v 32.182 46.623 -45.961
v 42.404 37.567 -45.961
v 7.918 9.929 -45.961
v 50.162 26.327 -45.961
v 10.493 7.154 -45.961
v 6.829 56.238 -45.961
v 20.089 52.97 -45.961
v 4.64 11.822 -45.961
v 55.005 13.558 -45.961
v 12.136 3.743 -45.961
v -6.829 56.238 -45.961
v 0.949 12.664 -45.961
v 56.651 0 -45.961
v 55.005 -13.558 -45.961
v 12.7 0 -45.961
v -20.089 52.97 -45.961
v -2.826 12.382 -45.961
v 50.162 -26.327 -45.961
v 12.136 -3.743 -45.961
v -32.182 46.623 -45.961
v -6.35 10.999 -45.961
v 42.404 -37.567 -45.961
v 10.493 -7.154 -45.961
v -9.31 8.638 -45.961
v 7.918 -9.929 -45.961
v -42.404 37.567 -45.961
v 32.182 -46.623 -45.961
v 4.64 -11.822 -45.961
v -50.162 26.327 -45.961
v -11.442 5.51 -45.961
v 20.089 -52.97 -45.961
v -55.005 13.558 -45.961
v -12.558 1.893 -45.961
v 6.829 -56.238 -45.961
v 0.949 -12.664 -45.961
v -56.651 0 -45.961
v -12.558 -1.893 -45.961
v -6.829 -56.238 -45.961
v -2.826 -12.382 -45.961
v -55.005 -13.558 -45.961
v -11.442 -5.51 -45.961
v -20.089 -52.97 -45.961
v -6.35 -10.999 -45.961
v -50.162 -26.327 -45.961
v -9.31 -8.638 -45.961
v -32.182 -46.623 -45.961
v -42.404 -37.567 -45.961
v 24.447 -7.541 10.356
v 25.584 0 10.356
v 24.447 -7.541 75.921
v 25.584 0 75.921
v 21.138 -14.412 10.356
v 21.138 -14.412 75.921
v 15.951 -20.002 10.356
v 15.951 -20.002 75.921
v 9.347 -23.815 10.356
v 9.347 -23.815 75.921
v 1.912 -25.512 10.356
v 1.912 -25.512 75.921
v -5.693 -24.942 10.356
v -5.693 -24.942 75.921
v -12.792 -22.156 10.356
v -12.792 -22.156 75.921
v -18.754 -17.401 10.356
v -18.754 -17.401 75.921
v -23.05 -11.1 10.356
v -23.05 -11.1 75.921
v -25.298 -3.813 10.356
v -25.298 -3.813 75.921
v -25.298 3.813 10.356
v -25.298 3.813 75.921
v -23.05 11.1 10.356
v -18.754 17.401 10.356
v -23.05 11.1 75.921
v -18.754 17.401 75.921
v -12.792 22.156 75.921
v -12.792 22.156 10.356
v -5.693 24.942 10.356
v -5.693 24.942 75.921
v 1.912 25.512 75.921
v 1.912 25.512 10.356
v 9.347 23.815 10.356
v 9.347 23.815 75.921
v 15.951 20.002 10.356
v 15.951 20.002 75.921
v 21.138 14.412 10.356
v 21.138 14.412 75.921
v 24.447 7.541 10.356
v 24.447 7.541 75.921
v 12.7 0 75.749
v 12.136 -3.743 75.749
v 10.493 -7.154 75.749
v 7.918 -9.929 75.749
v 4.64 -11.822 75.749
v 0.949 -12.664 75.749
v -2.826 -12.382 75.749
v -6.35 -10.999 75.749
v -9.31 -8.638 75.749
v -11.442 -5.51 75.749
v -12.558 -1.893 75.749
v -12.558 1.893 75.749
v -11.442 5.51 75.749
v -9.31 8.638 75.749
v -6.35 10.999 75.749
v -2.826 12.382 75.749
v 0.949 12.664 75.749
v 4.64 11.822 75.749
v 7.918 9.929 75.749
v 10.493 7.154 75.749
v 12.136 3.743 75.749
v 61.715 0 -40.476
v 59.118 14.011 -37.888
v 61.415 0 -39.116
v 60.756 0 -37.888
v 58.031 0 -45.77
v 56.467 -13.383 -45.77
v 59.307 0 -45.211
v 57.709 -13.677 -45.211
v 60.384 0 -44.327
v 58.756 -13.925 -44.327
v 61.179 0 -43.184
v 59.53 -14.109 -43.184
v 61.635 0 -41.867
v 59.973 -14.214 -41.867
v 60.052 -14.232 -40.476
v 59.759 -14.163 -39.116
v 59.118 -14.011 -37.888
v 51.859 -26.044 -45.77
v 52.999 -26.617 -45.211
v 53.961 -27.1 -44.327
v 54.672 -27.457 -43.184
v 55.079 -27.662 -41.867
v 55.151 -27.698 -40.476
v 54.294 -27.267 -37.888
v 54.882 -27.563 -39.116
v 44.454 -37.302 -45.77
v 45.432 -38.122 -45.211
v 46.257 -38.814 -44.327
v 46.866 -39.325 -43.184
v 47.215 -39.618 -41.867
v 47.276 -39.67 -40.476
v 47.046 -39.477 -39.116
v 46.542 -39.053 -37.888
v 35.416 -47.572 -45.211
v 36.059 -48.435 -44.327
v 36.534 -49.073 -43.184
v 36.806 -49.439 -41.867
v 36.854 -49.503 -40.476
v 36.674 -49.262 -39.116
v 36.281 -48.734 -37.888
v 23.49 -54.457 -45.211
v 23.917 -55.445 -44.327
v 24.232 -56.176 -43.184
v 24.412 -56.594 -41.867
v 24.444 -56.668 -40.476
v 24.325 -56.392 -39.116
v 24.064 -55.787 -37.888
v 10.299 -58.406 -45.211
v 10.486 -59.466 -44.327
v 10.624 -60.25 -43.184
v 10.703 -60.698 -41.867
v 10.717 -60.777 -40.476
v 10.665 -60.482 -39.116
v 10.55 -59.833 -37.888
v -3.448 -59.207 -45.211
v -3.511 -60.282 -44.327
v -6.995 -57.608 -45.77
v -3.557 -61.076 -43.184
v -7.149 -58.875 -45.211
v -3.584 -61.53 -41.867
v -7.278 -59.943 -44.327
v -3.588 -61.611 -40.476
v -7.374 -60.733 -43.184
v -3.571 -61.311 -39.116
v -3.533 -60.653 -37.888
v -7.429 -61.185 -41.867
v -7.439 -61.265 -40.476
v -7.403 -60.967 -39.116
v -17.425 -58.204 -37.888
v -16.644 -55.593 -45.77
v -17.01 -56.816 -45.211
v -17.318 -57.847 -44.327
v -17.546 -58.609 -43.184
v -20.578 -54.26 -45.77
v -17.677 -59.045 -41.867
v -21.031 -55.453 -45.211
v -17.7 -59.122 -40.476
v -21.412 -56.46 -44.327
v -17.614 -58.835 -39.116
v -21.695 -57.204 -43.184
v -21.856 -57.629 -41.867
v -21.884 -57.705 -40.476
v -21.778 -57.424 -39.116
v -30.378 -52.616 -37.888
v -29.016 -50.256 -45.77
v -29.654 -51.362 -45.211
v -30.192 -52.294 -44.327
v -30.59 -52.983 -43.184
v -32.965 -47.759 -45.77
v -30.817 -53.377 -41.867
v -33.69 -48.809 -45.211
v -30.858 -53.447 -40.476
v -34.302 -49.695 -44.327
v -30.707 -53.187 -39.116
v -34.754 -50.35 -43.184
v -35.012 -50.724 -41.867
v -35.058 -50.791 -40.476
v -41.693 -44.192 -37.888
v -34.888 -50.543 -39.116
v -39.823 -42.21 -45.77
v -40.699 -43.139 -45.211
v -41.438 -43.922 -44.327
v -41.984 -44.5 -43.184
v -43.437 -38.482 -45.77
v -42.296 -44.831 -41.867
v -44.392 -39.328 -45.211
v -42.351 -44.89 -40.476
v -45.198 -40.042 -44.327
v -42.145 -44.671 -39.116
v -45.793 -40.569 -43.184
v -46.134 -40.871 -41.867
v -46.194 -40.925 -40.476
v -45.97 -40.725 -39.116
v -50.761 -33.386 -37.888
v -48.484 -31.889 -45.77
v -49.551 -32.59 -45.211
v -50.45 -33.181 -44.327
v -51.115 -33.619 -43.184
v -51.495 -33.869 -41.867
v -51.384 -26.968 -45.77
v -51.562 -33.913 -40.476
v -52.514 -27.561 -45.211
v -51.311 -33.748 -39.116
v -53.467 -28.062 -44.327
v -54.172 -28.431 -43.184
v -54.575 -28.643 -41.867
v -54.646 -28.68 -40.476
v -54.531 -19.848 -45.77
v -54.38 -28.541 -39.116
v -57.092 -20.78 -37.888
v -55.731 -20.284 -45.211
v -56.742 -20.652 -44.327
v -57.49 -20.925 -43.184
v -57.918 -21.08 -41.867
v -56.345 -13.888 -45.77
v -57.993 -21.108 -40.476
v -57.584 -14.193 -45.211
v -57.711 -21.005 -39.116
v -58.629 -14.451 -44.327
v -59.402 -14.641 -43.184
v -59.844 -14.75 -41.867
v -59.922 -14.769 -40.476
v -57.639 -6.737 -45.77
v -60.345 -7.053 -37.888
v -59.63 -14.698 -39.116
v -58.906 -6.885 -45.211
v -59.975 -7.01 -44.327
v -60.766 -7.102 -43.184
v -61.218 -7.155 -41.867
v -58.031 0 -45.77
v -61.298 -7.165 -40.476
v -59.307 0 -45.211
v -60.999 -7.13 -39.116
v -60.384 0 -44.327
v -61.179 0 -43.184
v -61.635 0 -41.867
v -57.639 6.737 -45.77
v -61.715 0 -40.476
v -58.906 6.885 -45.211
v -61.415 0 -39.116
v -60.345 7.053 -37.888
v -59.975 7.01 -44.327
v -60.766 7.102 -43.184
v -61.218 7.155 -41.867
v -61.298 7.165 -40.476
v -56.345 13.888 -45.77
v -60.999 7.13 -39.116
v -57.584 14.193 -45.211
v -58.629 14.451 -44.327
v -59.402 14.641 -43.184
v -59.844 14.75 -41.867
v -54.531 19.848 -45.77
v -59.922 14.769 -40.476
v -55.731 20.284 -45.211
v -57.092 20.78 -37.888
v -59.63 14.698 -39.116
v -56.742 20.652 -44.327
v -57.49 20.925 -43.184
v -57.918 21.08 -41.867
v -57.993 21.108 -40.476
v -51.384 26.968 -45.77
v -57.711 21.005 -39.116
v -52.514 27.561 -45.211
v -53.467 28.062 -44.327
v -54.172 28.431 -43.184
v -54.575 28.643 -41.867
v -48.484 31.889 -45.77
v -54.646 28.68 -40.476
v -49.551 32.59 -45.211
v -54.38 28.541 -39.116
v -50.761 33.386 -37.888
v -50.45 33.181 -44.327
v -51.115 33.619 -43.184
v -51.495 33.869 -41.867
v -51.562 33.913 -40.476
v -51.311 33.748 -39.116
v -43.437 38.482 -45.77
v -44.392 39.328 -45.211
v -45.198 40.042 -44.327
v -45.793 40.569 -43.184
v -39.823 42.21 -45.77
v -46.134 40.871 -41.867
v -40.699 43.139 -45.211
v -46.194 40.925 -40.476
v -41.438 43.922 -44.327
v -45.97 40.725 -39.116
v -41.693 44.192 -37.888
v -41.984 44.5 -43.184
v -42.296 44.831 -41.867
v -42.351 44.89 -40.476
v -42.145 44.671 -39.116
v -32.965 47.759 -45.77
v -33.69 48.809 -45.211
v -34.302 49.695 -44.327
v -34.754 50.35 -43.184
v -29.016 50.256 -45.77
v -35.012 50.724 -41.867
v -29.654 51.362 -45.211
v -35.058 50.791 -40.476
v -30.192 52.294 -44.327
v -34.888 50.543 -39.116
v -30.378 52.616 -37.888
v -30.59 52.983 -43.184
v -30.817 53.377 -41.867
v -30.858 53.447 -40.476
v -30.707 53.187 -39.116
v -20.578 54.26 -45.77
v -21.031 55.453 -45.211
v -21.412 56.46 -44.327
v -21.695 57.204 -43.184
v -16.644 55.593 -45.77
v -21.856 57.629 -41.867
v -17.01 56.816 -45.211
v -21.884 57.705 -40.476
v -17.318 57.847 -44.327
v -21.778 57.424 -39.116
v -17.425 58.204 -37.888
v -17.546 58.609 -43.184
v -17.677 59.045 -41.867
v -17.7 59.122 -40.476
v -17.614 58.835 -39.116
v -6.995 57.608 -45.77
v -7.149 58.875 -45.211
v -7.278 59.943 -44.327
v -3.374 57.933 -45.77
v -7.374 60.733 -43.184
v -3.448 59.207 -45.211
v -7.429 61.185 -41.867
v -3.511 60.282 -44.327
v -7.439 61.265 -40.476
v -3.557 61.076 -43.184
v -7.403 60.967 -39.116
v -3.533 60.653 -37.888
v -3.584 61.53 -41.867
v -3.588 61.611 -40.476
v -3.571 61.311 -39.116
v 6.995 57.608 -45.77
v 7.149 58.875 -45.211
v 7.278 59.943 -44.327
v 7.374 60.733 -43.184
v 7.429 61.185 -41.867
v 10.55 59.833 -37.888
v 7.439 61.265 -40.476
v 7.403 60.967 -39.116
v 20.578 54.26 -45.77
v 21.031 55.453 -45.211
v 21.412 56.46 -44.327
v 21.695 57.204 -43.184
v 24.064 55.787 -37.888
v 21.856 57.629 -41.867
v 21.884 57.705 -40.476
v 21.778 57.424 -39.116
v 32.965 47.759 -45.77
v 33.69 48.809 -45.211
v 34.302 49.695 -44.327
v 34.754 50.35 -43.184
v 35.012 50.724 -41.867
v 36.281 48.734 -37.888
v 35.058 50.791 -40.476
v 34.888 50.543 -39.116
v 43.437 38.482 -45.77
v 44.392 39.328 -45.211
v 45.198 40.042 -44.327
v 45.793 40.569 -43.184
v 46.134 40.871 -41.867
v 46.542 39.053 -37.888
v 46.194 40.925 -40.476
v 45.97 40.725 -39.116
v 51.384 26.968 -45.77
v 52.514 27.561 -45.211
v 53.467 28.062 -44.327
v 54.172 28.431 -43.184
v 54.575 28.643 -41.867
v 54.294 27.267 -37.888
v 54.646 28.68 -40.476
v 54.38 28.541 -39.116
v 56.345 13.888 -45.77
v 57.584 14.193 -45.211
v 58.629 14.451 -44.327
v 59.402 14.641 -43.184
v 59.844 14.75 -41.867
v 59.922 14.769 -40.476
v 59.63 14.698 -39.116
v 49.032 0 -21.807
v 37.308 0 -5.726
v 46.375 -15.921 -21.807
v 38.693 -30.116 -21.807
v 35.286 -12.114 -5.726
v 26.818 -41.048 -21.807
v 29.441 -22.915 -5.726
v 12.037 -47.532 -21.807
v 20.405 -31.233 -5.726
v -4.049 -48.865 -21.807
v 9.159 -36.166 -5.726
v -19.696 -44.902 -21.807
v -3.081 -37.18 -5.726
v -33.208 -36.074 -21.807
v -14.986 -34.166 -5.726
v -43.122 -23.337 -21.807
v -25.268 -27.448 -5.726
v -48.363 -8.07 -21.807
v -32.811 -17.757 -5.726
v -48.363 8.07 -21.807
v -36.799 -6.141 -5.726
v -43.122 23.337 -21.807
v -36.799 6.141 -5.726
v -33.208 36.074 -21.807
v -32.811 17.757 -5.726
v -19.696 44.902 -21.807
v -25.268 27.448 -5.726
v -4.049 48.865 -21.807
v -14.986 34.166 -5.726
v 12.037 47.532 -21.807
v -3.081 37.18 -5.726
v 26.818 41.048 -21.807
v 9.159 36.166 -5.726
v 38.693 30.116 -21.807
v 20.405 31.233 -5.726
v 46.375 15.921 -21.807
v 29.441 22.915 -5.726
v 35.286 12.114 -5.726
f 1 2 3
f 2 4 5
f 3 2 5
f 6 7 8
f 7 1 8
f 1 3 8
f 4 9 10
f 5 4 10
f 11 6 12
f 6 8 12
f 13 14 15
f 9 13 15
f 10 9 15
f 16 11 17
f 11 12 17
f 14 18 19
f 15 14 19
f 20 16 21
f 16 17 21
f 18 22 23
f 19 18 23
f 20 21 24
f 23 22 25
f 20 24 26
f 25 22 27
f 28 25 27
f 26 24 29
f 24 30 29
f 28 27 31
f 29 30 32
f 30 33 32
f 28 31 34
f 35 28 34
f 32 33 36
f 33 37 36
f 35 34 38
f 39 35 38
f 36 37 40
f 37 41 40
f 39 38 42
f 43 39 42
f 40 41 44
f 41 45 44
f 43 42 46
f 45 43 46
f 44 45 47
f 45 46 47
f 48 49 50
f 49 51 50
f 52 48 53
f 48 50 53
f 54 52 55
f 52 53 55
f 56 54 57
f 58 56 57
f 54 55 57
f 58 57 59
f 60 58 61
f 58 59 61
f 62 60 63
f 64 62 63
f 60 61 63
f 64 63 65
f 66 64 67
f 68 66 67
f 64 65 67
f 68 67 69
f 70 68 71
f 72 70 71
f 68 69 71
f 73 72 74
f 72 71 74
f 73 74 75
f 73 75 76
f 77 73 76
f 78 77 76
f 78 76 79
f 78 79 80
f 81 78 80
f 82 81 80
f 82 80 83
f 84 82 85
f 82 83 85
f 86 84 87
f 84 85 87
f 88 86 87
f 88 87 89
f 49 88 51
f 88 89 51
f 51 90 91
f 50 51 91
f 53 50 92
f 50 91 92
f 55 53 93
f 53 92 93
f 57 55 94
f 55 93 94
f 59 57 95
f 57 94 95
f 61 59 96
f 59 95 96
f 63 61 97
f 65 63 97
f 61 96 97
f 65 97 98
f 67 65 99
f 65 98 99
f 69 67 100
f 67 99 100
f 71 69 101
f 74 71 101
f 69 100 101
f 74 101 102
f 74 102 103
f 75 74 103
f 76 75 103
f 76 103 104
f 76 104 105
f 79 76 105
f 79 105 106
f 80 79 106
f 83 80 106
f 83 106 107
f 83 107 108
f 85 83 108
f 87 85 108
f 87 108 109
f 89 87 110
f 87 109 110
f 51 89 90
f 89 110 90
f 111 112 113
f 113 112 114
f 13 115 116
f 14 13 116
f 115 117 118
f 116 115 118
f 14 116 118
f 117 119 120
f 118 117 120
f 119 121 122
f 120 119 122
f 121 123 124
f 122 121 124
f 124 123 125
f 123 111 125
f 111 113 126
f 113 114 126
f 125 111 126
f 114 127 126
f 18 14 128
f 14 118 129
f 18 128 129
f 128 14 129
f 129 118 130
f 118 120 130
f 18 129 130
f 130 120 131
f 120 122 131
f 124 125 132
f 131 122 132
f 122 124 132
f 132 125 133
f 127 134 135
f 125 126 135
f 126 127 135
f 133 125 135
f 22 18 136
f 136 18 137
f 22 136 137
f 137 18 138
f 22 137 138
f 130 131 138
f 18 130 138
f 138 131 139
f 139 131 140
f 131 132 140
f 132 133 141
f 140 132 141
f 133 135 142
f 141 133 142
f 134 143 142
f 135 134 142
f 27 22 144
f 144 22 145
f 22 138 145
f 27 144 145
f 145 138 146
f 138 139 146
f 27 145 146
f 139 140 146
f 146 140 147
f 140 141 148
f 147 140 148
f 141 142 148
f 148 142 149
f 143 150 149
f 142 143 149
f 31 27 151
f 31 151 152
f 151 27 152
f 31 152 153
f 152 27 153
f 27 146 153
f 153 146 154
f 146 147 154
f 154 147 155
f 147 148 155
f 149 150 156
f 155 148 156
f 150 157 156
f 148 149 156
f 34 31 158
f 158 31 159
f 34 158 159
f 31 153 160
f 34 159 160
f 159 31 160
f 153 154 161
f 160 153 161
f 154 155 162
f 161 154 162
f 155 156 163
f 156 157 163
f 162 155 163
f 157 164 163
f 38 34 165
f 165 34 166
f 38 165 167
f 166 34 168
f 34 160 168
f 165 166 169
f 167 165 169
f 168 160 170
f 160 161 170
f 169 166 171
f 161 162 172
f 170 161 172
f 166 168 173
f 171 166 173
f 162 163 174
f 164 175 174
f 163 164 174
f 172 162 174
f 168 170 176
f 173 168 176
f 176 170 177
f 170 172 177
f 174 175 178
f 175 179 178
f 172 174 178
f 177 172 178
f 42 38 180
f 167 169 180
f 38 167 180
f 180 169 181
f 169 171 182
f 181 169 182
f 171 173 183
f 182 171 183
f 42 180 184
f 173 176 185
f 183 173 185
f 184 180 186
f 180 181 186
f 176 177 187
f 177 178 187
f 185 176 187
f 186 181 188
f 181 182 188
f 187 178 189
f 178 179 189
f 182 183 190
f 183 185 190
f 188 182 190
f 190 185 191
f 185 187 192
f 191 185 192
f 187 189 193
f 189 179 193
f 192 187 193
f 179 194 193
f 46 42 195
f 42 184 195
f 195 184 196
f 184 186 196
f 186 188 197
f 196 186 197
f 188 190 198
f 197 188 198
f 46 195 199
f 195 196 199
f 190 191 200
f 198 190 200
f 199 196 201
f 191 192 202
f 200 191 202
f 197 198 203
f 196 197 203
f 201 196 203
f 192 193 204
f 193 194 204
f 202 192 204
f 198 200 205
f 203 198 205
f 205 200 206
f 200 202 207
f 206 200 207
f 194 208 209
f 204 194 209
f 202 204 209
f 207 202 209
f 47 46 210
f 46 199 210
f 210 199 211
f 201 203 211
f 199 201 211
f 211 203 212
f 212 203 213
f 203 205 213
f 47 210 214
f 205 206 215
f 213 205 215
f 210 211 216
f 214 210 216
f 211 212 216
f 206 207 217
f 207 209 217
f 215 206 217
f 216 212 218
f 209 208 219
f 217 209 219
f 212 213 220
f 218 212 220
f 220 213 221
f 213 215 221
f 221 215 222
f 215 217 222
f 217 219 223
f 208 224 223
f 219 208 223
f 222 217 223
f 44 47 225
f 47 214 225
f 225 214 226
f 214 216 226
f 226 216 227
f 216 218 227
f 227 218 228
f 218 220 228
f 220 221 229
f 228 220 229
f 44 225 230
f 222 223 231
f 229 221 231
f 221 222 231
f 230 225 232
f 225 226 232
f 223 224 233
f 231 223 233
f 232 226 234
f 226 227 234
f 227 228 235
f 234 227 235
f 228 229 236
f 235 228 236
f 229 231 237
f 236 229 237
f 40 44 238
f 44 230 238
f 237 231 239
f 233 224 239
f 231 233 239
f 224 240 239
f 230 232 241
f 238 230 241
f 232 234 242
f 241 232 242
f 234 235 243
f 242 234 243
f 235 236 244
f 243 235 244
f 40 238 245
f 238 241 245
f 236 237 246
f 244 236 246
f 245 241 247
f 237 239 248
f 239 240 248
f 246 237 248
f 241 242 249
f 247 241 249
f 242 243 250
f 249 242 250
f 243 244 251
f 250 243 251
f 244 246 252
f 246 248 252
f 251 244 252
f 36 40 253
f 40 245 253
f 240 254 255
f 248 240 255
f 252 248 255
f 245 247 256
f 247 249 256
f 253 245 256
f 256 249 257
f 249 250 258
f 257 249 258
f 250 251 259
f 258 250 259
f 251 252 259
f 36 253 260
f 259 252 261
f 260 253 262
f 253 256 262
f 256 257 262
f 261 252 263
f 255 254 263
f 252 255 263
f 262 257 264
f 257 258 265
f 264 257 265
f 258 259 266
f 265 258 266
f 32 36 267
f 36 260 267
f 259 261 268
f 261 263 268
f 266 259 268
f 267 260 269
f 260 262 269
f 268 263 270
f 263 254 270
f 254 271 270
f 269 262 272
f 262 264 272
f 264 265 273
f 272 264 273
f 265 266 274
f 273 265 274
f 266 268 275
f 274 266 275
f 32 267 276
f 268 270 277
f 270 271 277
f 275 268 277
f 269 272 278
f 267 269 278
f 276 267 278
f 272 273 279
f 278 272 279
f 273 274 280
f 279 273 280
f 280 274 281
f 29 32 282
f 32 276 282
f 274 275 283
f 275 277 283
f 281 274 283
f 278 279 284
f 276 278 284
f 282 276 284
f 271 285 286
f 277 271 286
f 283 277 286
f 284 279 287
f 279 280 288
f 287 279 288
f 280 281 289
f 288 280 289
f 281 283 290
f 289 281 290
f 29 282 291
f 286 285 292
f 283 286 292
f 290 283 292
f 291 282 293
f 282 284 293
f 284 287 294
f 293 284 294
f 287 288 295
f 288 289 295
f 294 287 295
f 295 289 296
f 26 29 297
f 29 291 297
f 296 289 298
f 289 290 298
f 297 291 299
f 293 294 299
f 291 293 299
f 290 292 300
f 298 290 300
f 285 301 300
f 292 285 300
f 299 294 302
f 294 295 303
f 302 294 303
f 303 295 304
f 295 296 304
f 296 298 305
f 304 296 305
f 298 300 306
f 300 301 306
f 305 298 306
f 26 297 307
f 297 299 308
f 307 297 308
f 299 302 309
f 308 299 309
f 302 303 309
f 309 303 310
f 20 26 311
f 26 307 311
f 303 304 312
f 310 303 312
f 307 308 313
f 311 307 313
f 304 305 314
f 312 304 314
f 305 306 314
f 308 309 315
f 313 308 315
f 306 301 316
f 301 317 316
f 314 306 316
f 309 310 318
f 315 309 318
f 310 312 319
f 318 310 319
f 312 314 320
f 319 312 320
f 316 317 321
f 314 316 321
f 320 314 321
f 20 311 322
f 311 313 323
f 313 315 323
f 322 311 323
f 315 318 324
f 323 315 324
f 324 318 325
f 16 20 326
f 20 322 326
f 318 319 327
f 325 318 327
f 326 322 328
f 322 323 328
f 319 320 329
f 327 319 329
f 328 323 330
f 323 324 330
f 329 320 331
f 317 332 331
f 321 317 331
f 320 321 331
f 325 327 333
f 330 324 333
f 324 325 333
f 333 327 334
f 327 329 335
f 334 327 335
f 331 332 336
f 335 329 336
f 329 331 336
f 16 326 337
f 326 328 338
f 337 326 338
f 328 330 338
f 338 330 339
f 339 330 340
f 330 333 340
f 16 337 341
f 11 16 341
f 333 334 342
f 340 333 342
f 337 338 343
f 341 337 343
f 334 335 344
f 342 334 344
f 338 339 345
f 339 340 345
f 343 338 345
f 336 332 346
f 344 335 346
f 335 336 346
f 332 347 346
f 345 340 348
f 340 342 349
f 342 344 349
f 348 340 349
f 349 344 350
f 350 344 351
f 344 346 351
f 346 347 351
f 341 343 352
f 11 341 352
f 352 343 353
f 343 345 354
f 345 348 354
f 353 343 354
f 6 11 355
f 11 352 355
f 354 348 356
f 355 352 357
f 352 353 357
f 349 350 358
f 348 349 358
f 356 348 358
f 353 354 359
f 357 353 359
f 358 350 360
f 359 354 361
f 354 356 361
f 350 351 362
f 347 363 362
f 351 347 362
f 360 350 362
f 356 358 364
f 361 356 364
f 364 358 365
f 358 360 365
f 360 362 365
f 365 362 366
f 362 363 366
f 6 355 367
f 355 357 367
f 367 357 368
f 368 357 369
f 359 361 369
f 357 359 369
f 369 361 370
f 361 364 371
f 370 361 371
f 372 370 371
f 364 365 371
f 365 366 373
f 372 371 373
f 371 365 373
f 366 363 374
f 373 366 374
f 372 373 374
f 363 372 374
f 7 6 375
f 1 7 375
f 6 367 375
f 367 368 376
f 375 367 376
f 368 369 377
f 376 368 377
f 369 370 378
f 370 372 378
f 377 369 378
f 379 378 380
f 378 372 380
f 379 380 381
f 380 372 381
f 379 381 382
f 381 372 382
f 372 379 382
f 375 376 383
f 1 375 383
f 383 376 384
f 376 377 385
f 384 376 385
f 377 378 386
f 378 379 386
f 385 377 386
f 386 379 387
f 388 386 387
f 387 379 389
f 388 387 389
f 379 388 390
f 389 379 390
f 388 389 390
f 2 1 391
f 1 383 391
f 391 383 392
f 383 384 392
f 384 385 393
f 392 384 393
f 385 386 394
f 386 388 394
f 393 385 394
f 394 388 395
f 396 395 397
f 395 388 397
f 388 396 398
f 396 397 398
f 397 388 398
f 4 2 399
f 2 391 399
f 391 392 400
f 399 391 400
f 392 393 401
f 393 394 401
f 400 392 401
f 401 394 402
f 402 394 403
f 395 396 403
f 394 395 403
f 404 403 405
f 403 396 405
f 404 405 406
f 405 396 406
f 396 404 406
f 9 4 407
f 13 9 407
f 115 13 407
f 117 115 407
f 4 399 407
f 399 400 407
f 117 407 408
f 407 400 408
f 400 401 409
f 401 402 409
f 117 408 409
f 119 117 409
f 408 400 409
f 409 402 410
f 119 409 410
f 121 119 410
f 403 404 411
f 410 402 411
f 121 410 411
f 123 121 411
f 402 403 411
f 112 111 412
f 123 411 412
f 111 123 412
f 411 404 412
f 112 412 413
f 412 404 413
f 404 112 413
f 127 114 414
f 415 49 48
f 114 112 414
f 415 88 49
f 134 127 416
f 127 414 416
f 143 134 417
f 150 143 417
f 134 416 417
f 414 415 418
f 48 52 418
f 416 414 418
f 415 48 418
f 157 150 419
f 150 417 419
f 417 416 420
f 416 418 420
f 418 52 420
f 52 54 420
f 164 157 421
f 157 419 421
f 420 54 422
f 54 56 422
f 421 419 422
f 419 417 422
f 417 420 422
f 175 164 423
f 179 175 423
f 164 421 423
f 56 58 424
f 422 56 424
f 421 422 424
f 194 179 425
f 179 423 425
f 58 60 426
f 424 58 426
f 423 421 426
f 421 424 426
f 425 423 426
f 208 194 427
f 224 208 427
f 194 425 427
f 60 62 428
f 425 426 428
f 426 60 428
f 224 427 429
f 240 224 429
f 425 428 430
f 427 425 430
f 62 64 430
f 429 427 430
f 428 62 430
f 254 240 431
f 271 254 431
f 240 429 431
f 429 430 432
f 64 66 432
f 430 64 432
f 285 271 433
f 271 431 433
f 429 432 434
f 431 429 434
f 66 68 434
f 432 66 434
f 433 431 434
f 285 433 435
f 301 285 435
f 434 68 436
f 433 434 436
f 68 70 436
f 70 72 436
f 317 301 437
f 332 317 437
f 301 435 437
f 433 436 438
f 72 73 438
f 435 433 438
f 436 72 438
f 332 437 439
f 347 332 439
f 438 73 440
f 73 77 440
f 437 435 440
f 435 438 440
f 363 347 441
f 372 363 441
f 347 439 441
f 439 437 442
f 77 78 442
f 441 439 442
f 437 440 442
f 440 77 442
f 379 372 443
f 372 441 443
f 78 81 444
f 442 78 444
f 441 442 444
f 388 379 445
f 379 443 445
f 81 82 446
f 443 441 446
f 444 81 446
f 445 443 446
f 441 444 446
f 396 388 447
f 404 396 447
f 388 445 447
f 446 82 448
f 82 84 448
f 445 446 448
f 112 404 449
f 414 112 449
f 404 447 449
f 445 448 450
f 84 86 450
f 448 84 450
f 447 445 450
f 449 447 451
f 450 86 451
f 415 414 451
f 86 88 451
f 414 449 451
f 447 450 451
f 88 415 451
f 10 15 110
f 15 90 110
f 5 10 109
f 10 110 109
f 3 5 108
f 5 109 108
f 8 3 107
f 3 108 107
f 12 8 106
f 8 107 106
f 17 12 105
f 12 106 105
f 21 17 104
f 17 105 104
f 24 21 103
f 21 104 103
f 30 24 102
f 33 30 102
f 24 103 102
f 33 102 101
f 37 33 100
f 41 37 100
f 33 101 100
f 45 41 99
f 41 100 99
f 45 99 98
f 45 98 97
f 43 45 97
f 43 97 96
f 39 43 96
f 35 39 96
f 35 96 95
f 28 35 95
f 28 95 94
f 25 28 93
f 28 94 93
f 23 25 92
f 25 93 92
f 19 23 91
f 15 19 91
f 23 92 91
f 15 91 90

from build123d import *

# Parameters (mm, degrees)
F2_R     = 12.7
F3_DEPTH = 76.2
F4_R     = 5.08


# Not quite as in the source:
# - a feature names something its author has since deleted; it is built from what else it names


with BuildPart() as f1:
    # F0 (on Front) → F1 (revolve)
    with BuildSketch(Plane.XZ):
        Polygon((0, -45.9611259629), (66.641533635, -45.9611259629), (25.5837057043, 10.3556019993), (25.5837057043, 75.9213268757), (0, 75.5790621042), align=None)
    revolve(axis=Axis((0, 0, 14.8089680707), (0, 0, -1)))

    # F2 (on Top) → F3 (cut, symmetric)
    with BuildSketch(Plane.XY):
        Circle(F2_R)
    extrude(amount=F3_DEPTH, both=True, mode=Mode.SUBTRACT)

    # F4
    f4_edges = [f1.edges().sort_by_distance(p)[0] for p in [
        (-66.641534, 0, -45.961126),
    ]]
    fillet(f4_edges, radius=F4_R)


solid = f1.part
